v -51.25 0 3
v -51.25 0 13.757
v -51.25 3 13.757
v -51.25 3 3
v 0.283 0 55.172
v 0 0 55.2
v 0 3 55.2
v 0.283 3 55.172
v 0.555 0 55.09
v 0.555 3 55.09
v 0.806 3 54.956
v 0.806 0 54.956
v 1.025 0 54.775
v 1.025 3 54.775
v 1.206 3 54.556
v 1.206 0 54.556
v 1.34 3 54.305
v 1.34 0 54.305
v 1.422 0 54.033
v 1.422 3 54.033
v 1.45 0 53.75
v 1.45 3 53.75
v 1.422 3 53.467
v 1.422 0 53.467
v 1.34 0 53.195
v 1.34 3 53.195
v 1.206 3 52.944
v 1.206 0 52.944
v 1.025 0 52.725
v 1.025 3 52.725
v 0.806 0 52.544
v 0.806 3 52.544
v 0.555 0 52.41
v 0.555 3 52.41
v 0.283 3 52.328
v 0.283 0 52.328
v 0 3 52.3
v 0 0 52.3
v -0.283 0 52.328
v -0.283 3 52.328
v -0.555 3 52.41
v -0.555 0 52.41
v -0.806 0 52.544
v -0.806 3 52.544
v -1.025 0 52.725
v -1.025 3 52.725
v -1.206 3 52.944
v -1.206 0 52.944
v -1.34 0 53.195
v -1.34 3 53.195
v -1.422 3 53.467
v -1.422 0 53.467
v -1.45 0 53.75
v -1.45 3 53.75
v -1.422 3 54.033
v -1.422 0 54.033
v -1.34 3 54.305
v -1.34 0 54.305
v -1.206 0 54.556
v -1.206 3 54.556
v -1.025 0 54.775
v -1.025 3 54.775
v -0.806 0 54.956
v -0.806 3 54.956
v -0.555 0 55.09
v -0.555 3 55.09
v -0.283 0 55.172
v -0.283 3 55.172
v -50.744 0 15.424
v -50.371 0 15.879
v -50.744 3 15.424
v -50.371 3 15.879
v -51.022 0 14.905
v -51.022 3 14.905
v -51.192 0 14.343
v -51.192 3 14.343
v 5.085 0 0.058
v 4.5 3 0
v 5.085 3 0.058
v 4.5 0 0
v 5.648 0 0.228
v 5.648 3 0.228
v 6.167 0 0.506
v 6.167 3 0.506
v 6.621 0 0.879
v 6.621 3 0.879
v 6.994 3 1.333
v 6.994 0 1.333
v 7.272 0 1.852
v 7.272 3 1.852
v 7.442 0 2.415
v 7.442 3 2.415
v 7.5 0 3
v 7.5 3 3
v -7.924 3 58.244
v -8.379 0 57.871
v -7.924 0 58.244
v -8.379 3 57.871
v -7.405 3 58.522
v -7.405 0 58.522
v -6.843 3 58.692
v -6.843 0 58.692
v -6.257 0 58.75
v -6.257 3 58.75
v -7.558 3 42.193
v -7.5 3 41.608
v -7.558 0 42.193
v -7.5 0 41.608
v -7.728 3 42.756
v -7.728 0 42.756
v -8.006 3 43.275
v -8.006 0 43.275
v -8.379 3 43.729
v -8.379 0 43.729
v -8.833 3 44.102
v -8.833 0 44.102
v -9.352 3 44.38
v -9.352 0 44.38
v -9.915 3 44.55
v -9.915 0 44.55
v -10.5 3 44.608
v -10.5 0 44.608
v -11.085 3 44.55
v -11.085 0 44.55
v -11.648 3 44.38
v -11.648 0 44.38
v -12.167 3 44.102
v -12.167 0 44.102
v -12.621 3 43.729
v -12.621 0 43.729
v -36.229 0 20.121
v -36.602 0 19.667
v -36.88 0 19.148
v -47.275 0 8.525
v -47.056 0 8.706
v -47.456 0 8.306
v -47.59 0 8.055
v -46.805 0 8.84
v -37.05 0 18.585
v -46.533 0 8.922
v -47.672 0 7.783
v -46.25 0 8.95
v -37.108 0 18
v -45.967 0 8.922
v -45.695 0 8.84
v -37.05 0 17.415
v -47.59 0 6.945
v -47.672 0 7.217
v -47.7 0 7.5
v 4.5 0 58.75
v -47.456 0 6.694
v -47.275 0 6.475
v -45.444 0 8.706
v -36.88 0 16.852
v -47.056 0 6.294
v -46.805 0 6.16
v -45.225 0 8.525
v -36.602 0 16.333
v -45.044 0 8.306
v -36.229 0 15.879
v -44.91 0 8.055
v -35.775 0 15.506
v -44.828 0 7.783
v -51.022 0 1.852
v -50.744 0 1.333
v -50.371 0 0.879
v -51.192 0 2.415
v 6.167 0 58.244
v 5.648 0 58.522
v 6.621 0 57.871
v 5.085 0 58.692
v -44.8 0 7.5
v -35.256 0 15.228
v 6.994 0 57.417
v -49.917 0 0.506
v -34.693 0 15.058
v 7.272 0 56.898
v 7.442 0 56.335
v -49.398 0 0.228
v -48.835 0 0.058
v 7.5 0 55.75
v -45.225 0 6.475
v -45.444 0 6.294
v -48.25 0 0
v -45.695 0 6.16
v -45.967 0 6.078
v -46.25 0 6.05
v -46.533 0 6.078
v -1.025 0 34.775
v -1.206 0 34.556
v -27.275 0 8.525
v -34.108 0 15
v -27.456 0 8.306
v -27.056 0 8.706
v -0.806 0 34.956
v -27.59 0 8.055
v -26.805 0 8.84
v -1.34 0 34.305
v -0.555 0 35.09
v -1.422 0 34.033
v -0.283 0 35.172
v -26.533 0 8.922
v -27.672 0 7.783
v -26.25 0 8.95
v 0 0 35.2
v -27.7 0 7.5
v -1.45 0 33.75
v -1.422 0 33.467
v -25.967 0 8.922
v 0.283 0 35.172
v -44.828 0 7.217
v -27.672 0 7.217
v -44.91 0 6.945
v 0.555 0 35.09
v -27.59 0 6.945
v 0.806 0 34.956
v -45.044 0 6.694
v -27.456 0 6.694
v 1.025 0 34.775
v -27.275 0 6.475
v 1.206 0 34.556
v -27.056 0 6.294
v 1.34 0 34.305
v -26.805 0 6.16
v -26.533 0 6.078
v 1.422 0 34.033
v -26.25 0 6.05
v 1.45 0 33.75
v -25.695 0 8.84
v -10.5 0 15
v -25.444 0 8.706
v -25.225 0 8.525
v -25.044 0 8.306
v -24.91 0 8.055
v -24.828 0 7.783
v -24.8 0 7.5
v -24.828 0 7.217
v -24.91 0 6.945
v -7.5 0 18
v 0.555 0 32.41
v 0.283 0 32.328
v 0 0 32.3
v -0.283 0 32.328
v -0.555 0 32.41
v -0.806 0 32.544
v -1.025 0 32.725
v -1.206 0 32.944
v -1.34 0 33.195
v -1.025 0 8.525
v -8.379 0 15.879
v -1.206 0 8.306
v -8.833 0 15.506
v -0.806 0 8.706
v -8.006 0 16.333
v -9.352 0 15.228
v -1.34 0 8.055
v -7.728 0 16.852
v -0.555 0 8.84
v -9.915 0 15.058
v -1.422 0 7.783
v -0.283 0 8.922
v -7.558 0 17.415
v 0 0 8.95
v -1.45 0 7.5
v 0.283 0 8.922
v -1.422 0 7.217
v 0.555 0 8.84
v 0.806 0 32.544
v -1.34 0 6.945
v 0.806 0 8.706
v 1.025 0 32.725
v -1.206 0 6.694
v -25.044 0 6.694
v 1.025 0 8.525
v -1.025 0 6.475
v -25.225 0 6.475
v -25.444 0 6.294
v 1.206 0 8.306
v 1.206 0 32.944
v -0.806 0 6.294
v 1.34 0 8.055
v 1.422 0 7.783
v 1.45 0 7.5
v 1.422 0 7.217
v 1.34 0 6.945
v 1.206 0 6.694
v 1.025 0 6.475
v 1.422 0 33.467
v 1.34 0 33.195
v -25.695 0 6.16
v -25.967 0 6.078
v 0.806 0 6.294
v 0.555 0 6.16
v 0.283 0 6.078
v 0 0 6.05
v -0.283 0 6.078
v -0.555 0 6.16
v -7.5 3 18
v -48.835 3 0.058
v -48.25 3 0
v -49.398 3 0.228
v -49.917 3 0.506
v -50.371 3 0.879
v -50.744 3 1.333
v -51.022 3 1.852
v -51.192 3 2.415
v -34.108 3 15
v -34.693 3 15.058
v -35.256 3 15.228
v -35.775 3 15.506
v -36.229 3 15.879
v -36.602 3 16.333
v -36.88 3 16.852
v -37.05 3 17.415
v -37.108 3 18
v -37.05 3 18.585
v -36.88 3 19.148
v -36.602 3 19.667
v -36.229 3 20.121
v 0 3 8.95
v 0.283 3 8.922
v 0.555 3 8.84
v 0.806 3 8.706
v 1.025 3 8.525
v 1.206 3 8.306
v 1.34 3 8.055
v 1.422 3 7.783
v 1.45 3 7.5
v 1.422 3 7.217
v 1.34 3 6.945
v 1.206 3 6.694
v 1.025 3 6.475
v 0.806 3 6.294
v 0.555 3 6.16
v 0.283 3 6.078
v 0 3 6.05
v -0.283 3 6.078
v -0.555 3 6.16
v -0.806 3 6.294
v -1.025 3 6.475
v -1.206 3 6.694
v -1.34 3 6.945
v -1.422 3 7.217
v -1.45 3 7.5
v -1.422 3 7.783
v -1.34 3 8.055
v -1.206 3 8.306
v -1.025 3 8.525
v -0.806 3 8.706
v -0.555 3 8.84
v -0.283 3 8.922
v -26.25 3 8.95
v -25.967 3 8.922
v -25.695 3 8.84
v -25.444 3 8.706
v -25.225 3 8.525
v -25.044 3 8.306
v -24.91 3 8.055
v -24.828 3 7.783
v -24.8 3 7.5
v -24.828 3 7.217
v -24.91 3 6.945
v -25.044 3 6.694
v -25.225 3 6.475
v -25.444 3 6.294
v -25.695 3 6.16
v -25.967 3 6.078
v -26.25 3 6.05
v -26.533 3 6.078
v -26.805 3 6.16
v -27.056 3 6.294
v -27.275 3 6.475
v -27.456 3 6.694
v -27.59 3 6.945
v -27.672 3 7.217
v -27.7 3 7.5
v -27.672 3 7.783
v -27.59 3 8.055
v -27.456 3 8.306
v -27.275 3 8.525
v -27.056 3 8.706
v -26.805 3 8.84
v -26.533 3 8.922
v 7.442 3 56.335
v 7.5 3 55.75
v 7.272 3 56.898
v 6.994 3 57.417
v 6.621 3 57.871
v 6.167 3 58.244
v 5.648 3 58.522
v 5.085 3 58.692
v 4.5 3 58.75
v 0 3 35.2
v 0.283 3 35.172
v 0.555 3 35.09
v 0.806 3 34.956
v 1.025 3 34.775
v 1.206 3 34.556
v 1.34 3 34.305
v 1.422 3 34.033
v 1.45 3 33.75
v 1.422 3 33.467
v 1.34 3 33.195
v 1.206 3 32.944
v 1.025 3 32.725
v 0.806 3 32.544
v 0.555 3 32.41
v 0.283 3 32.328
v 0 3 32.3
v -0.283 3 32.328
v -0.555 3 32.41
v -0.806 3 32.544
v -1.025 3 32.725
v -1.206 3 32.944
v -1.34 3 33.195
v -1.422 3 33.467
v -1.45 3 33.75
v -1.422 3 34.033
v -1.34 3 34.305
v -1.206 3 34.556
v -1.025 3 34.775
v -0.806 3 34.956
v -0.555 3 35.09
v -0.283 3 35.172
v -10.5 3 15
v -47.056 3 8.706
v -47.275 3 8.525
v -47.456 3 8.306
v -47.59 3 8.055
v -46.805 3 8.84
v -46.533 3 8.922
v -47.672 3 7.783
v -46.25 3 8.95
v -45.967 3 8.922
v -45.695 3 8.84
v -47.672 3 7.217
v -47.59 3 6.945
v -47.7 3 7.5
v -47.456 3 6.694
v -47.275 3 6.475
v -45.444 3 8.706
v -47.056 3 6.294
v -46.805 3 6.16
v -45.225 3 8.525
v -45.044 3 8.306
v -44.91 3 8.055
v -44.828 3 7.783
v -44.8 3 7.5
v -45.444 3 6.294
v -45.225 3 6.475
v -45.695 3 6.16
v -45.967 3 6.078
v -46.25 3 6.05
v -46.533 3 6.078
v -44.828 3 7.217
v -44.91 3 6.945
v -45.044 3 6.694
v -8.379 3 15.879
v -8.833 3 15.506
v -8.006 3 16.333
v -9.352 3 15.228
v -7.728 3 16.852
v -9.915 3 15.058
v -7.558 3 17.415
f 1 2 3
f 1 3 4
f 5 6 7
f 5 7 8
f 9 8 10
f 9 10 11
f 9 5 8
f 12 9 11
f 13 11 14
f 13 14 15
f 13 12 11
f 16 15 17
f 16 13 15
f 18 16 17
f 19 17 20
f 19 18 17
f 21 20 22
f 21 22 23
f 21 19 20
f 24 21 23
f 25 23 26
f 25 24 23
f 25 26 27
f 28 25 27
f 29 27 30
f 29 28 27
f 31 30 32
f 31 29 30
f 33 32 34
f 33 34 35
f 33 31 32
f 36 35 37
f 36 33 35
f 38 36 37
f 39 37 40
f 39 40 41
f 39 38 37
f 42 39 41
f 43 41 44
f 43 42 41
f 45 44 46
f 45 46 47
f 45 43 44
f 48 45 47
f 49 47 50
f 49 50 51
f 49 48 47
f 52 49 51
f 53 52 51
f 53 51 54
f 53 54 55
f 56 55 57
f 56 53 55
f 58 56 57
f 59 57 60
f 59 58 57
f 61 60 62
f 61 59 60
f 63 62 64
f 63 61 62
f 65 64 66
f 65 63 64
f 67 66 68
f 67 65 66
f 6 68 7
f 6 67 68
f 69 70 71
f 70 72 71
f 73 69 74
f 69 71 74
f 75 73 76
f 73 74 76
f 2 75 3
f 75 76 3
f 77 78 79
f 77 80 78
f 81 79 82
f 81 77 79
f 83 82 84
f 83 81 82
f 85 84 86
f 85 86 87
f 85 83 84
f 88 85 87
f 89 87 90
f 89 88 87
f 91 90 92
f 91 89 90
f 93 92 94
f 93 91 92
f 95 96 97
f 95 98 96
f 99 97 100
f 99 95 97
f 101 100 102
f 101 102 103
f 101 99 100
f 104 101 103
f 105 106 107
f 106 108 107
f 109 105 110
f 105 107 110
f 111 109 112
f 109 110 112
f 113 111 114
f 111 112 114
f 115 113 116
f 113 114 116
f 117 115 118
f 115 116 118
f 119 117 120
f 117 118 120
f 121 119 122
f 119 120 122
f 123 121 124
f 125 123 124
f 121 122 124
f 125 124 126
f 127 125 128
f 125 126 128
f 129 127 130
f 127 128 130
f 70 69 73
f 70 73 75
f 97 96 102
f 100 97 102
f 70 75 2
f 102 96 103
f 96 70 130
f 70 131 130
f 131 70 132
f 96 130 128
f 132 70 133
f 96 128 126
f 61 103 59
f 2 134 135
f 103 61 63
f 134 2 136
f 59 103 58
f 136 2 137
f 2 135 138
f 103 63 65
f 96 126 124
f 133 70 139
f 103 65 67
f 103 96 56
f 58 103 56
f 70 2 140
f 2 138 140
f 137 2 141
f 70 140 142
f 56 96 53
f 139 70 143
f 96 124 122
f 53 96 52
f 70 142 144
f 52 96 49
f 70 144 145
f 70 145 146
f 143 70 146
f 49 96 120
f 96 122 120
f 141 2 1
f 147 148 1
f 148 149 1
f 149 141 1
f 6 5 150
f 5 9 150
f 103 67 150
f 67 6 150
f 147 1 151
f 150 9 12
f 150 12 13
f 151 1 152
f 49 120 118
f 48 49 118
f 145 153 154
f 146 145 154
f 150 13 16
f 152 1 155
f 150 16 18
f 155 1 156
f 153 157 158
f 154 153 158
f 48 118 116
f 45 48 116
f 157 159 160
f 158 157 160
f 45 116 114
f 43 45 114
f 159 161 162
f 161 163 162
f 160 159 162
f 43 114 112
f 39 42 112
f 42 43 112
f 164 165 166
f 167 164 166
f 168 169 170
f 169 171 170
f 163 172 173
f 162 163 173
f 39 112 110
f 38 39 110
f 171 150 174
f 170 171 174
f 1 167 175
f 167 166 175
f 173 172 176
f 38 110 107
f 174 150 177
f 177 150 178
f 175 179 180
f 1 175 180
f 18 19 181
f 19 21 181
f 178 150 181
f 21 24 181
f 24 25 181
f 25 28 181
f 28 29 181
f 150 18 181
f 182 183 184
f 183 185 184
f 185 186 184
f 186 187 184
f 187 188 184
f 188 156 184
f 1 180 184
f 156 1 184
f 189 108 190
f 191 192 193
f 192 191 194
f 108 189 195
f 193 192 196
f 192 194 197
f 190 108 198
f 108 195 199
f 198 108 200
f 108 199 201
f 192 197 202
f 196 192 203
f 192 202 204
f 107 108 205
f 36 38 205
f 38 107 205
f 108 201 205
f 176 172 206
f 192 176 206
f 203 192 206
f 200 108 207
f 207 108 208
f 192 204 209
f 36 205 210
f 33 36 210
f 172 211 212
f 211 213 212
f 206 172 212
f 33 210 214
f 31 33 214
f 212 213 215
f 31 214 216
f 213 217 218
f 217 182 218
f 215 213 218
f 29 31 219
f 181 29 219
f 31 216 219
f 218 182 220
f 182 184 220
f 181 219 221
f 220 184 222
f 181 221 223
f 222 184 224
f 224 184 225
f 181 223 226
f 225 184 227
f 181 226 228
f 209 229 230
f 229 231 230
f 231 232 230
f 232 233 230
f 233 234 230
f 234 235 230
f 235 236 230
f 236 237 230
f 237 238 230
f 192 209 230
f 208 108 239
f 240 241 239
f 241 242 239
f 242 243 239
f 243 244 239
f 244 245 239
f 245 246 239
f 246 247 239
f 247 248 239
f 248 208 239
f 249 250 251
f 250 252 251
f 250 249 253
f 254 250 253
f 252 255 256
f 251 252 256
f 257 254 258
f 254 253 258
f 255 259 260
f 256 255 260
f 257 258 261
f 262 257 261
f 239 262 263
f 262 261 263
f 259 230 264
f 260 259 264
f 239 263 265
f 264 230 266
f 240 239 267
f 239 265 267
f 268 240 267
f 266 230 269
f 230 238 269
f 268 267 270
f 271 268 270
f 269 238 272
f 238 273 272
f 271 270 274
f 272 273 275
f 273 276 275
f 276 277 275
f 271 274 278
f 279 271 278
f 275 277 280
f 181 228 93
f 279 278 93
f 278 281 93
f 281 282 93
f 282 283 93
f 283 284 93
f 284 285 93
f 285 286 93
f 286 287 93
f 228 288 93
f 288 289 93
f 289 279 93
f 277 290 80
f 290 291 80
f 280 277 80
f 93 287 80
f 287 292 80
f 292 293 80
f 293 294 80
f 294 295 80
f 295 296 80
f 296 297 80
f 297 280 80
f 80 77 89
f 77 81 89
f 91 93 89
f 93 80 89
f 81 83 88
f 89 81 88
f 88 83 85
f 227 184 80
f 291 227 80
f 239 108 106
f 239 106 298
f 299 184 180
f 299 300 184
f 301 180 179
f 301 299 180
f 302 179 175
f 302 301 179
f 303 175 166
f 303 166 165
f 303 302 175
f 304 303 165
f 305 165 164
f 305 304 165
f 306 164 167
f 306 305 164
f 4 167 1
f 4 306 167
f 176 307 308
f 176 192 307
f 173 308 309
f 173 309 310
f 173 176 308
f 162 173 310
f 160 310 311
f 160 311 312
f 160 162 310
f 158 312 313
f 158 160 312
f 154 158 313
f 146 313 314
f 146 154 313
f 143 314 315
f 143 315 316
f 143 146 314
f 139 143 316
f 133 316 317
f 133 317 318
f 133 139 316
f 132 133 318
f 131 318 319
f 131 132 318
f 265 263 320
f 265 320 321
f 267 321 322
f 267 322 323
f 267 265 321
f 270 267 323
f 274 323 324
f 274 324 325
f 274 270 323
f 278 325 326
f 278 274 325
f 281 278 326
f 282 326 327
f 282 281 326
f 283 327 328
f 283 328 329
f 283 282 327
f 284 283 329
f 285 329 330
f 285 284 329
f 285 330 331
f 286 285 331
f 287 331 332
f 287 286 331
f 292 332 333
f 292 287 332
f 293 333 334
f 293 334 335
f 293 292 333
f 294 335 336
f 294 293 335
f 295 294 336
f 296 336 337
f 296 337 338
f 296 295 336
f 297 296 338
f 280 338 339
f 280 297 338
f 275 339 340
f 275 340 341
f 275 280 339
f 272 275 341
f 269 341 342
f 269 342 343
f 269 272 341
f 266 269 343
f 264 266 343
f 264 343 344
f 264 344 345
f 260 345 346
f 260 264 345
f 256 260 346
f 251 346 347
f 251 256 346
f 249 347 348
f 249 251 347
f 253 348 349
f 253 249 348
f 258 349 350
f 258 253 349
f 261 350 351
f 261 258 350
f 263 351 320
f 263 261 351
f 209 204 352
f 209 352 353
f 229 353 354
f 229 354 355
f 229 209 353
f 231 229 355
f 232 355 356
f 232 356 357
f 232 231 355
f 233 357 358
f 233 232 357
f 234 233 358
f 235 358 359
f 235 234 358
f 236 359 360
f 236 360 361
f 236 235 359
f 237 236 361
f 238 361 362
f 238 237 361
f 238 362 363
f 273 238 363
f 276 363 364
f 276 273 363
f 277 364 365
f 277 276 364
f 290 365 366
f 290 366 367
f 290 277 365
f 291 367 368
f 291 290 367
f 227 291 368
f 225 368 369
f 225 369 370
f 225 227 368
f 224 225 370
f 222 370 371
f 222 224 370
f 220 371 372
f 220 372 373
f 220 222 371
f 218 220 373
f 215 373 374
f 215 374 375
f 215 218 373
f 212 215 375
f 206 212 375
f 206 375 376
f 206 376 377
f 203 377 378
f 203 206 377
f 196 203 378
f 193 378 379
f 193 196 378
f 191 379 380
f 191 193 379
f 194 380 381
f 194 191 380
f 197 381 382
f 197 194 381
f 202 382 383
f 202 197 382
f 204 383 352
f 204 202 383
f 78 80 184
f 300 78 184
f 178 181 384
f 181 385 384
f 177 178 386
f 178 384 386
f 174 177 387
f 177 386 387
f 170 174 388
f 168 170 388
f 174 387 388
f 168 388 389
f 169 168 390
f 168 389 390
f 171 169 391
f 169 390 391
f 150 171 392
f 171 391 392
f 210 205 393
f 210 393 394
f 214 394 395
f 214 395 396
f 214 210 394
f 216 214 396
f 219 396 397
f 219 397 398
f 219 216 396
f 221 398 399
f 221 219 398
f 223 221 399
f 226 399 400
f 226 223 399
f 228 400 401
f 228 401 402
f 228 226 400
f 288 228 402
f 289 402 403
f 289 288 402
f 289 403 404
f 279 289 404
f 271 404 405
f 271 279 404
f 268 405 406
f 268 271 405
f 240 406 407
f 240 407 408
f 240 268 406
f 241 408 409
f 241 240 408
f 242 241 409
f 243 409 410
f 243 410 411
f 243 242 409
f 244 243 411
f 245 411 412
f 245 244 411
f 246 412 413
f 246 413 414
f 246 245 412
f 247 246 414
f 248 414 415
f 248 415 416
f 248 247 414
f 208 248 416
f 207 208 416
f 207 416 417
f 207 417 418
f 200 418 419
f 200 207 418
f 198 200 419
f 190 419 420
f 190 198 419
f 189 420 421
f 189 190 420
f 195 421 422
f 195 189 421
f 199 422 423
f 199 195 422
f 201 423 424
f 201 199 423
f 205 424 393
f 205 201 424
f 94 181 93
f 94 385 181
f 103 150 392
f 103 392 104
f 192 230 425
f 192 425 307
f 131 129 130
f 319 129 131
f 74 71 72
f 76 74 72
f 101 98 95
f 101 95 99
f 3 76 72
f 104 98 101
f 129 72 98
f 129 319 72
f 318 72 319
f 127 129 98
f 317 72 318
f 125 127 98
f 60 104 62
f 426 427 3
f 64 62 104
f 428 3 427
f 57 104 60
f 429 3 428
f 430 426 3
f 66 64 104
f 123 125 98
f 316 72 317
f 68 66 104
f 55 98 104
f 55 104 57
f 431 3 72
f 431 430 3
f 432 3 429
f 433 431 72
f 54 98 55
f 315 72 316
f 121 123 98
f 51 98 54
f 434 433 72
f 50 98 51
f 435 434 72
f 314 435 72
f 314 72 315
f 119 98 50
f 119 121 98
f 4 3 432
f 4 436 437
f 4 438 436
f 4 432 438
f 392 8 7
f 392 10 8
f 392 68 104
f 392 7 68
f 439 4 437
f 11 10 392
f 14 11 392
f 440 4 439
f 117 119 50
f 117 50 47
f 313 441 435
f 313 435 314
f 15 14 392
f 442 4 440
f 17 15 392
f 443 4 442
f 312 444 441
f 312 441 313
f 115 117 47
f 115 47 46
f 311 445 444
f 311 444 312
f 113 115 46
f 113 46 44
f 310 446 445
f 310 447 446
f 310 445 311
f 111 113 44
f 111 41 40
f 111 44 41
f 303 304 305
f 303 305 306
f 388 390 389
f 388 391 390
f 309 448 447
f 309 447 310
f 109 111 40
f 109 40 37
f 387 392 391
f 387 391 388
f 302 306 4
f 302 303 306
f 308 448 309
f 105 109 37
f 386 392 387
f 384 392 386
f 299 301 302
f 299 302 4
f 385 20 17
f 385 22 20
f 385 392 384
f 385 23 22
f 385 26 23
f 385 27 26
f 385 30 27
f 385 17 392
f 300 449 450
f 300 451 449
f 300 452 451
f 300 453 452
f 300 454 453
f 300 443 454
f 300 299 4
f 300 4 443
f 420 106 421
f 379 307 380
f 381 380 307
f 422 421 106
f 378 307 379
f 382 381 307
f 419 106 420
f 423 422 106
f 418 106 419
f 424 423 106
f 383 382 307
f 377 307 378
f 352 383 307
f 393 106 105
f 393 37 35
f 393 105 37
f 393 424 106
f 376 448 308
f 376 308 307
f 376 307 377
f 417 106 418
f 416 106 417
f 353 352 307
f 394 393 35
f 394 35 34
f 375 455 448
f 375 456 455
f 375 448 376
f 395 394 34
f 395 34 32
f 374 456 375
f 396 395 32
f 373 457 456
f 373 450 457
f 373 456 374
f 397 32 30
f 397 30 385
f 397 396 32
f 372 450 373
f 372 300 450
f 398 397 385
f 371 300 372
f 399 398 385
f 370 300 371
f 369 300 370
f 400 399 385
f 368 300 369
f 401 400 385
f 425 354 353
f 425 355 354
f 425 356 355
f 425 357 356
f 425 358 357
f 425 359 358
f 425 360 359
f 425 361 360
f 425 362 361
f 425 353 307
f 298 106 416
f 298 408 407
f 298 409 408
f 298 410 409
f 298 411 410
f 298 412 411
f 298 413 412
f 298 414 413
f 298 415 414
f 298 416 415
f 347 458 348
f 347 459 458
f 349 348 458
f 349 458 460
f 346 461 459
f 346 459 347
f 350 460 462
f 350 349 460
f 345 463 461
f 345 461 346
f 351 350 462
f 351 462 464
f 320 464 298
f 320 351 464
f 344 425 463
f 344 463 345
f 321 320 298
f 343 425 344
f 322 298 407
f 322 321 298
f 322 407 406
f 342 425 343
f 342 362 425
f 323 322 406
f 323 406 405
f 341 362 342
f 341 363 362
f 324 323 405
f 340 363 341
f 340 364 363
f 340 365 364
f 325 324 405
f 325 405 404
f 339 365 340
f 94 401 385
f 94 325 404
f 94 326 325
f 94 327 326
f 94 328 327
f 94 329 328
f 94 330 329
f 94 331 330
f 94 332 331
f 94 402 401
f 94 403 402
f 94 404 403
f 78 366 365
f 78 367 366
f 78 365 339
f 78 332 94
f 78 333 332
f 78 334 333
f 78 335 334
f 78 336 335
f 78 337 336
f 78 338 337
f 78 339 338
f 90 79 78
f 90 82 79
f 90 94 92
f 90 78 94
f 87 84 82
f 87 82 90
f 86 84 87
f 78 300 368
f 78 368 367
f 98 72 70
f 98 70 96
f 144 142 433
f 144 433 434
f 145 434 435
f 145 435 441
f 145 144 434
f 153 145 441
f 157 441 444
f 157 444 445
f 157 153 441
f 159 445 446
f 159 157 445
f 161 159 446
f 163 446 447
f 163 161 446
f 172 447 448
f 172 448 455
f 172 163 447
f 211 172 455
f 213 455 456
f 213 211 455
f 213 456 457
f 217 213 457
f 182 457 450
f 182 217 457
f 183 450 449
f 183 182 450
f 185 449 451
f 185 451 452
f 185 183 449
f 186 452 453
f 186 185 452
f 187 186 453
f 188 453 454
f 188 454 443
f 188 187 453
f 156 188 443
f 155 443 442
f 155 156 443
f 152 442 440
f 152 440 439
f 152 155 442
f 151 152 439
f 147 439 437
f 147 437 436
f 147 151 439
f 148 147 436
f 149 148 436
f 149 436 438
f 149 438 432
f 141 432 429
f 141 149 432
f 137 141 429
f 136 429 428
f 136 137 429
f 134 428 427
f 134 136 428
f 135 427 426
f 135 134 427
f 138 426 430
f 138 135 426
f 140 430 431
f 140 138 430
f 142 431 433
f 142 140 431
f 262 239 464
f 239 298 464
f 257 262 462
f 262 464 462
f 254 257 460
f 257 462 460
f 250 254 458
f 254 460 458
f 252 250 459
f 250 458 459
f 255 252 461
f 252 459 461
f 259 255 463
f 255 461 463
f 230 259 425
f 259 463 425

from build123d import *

# Parameters (mm, degrees)
SKETCH_1_R          = 1.45
EXTRUDE_1_DEPTH     = 3
EXTRUDE_2_DEPTH     = 3
SKETCH_4_W          = 43.75
SKETCH_4_H          = 58.75
CUT_EXTRUDE_2_DEPTH = 79.02002948
FILLET_1_R          = 3


with BuildPart() as part:
    # 草图1 → 凸台-拉伸1 (new body)
    with BuildSketch(Plane(origin=(0, 0, 0), x_dir=(1, 0, 0), z_dir=(0, 1, 0))):
        Polygon((-51.25, 0), (0, 0), (51.25, 0), (51.25, -15), (7.5, -15), (7.5, -58.75), (-7.5, -58.75), (-7.5, -15), (-51.25, -15), align=None)
        with Locations(Location((0, -7.5, 0), (0, 0, 270))):
            Circle(SKETCH_1_R, mode=Mode.SUBTRACT)
        with Locations(Location((0, -33.75, 0), (0, 0, 270))):
            Circle(SKETCH_1_R, mode=Mode.SUBTRACT)
        with Locations(Location((0, -53.75, 0), (0, 0, 270))):
            Circle(SKETCH_1_R, mode=Mode.SUBTRACT)
        with Locations(Location((-26.25, -7.5, 0), (0, 0, 270))):
            Circle(SKETCH_1_R, mode=Mode.SUBTRACT)
        with Locations(Location((-46.25, -7.5, 0), (0, 0, 270))):
            Circle(SKETCH_1_R, mode=Mode.SUBTRACT)
        with Locations(Location((46.25, -7.5, 0), (0, 0, 90))):
            Circle(SKETCH_1_R, mode=Mode.SUBTRACT)
        with Locations(Location((26.25, -7.5, 0), (0, 0, 90))):
            Circle(SKETCH_1_R, mode=Mode.SUBTRACT)
    extrude(amount=EXTRUDE_1_DEPTH)

    # 草图2 → 凸台-拉伸2 (add)
    with BuildSketch(Plane(origin=(0, 3, 0), x_dir=(1, 0, 0), z_dir=(0, 1, 0))):
        Polygon((-51.25, -15), (-7.5, -58.75), (-7.5, -48.850505063), (-41.350505063, -15), align=None)
        Polygon((41.350505063, -15), (51.25, -15), (7.5, -58.75), (7.5, -48.850505063), align=None)
    extrude(amount=-EXTRUDE_2_DEPTH)

    # 草图4 → 切除-拉伸2 (cut, through all)
    with BuildSketch(Plane(origin=(0, 3, 0), x_dir=(1, 0, 0), z_dir=(0, 1, 0))):
        with Locations((29.375, -29.375)):
            Rectangle(SKETCH_4_W, SKETCH_4_H)
    extrude(amount=-CUT_EXTRUDE_2_DEPTH, mode=Mode.SUBTRACT)

    # 圆角1
    fillet_1_edges = [part.edges().sort_by_distance(p)[0] for p in [
        (-51.25, 1.5, 0),
        (7.5, 1.5, 58.75),
        (-7.5, 1.5, 58.75),
        (-7.5, 1.5, 15),
        (-51.25, 1.5, 15),
        (-7.5, 1.5, 48.850505063),
        (-41.350505063, 1.5, 15),
        (7.5, 1.5, 0),
    ]]
    fillet(fillet_1_edges, radius=FILLET_1_R)


solid = part.part
